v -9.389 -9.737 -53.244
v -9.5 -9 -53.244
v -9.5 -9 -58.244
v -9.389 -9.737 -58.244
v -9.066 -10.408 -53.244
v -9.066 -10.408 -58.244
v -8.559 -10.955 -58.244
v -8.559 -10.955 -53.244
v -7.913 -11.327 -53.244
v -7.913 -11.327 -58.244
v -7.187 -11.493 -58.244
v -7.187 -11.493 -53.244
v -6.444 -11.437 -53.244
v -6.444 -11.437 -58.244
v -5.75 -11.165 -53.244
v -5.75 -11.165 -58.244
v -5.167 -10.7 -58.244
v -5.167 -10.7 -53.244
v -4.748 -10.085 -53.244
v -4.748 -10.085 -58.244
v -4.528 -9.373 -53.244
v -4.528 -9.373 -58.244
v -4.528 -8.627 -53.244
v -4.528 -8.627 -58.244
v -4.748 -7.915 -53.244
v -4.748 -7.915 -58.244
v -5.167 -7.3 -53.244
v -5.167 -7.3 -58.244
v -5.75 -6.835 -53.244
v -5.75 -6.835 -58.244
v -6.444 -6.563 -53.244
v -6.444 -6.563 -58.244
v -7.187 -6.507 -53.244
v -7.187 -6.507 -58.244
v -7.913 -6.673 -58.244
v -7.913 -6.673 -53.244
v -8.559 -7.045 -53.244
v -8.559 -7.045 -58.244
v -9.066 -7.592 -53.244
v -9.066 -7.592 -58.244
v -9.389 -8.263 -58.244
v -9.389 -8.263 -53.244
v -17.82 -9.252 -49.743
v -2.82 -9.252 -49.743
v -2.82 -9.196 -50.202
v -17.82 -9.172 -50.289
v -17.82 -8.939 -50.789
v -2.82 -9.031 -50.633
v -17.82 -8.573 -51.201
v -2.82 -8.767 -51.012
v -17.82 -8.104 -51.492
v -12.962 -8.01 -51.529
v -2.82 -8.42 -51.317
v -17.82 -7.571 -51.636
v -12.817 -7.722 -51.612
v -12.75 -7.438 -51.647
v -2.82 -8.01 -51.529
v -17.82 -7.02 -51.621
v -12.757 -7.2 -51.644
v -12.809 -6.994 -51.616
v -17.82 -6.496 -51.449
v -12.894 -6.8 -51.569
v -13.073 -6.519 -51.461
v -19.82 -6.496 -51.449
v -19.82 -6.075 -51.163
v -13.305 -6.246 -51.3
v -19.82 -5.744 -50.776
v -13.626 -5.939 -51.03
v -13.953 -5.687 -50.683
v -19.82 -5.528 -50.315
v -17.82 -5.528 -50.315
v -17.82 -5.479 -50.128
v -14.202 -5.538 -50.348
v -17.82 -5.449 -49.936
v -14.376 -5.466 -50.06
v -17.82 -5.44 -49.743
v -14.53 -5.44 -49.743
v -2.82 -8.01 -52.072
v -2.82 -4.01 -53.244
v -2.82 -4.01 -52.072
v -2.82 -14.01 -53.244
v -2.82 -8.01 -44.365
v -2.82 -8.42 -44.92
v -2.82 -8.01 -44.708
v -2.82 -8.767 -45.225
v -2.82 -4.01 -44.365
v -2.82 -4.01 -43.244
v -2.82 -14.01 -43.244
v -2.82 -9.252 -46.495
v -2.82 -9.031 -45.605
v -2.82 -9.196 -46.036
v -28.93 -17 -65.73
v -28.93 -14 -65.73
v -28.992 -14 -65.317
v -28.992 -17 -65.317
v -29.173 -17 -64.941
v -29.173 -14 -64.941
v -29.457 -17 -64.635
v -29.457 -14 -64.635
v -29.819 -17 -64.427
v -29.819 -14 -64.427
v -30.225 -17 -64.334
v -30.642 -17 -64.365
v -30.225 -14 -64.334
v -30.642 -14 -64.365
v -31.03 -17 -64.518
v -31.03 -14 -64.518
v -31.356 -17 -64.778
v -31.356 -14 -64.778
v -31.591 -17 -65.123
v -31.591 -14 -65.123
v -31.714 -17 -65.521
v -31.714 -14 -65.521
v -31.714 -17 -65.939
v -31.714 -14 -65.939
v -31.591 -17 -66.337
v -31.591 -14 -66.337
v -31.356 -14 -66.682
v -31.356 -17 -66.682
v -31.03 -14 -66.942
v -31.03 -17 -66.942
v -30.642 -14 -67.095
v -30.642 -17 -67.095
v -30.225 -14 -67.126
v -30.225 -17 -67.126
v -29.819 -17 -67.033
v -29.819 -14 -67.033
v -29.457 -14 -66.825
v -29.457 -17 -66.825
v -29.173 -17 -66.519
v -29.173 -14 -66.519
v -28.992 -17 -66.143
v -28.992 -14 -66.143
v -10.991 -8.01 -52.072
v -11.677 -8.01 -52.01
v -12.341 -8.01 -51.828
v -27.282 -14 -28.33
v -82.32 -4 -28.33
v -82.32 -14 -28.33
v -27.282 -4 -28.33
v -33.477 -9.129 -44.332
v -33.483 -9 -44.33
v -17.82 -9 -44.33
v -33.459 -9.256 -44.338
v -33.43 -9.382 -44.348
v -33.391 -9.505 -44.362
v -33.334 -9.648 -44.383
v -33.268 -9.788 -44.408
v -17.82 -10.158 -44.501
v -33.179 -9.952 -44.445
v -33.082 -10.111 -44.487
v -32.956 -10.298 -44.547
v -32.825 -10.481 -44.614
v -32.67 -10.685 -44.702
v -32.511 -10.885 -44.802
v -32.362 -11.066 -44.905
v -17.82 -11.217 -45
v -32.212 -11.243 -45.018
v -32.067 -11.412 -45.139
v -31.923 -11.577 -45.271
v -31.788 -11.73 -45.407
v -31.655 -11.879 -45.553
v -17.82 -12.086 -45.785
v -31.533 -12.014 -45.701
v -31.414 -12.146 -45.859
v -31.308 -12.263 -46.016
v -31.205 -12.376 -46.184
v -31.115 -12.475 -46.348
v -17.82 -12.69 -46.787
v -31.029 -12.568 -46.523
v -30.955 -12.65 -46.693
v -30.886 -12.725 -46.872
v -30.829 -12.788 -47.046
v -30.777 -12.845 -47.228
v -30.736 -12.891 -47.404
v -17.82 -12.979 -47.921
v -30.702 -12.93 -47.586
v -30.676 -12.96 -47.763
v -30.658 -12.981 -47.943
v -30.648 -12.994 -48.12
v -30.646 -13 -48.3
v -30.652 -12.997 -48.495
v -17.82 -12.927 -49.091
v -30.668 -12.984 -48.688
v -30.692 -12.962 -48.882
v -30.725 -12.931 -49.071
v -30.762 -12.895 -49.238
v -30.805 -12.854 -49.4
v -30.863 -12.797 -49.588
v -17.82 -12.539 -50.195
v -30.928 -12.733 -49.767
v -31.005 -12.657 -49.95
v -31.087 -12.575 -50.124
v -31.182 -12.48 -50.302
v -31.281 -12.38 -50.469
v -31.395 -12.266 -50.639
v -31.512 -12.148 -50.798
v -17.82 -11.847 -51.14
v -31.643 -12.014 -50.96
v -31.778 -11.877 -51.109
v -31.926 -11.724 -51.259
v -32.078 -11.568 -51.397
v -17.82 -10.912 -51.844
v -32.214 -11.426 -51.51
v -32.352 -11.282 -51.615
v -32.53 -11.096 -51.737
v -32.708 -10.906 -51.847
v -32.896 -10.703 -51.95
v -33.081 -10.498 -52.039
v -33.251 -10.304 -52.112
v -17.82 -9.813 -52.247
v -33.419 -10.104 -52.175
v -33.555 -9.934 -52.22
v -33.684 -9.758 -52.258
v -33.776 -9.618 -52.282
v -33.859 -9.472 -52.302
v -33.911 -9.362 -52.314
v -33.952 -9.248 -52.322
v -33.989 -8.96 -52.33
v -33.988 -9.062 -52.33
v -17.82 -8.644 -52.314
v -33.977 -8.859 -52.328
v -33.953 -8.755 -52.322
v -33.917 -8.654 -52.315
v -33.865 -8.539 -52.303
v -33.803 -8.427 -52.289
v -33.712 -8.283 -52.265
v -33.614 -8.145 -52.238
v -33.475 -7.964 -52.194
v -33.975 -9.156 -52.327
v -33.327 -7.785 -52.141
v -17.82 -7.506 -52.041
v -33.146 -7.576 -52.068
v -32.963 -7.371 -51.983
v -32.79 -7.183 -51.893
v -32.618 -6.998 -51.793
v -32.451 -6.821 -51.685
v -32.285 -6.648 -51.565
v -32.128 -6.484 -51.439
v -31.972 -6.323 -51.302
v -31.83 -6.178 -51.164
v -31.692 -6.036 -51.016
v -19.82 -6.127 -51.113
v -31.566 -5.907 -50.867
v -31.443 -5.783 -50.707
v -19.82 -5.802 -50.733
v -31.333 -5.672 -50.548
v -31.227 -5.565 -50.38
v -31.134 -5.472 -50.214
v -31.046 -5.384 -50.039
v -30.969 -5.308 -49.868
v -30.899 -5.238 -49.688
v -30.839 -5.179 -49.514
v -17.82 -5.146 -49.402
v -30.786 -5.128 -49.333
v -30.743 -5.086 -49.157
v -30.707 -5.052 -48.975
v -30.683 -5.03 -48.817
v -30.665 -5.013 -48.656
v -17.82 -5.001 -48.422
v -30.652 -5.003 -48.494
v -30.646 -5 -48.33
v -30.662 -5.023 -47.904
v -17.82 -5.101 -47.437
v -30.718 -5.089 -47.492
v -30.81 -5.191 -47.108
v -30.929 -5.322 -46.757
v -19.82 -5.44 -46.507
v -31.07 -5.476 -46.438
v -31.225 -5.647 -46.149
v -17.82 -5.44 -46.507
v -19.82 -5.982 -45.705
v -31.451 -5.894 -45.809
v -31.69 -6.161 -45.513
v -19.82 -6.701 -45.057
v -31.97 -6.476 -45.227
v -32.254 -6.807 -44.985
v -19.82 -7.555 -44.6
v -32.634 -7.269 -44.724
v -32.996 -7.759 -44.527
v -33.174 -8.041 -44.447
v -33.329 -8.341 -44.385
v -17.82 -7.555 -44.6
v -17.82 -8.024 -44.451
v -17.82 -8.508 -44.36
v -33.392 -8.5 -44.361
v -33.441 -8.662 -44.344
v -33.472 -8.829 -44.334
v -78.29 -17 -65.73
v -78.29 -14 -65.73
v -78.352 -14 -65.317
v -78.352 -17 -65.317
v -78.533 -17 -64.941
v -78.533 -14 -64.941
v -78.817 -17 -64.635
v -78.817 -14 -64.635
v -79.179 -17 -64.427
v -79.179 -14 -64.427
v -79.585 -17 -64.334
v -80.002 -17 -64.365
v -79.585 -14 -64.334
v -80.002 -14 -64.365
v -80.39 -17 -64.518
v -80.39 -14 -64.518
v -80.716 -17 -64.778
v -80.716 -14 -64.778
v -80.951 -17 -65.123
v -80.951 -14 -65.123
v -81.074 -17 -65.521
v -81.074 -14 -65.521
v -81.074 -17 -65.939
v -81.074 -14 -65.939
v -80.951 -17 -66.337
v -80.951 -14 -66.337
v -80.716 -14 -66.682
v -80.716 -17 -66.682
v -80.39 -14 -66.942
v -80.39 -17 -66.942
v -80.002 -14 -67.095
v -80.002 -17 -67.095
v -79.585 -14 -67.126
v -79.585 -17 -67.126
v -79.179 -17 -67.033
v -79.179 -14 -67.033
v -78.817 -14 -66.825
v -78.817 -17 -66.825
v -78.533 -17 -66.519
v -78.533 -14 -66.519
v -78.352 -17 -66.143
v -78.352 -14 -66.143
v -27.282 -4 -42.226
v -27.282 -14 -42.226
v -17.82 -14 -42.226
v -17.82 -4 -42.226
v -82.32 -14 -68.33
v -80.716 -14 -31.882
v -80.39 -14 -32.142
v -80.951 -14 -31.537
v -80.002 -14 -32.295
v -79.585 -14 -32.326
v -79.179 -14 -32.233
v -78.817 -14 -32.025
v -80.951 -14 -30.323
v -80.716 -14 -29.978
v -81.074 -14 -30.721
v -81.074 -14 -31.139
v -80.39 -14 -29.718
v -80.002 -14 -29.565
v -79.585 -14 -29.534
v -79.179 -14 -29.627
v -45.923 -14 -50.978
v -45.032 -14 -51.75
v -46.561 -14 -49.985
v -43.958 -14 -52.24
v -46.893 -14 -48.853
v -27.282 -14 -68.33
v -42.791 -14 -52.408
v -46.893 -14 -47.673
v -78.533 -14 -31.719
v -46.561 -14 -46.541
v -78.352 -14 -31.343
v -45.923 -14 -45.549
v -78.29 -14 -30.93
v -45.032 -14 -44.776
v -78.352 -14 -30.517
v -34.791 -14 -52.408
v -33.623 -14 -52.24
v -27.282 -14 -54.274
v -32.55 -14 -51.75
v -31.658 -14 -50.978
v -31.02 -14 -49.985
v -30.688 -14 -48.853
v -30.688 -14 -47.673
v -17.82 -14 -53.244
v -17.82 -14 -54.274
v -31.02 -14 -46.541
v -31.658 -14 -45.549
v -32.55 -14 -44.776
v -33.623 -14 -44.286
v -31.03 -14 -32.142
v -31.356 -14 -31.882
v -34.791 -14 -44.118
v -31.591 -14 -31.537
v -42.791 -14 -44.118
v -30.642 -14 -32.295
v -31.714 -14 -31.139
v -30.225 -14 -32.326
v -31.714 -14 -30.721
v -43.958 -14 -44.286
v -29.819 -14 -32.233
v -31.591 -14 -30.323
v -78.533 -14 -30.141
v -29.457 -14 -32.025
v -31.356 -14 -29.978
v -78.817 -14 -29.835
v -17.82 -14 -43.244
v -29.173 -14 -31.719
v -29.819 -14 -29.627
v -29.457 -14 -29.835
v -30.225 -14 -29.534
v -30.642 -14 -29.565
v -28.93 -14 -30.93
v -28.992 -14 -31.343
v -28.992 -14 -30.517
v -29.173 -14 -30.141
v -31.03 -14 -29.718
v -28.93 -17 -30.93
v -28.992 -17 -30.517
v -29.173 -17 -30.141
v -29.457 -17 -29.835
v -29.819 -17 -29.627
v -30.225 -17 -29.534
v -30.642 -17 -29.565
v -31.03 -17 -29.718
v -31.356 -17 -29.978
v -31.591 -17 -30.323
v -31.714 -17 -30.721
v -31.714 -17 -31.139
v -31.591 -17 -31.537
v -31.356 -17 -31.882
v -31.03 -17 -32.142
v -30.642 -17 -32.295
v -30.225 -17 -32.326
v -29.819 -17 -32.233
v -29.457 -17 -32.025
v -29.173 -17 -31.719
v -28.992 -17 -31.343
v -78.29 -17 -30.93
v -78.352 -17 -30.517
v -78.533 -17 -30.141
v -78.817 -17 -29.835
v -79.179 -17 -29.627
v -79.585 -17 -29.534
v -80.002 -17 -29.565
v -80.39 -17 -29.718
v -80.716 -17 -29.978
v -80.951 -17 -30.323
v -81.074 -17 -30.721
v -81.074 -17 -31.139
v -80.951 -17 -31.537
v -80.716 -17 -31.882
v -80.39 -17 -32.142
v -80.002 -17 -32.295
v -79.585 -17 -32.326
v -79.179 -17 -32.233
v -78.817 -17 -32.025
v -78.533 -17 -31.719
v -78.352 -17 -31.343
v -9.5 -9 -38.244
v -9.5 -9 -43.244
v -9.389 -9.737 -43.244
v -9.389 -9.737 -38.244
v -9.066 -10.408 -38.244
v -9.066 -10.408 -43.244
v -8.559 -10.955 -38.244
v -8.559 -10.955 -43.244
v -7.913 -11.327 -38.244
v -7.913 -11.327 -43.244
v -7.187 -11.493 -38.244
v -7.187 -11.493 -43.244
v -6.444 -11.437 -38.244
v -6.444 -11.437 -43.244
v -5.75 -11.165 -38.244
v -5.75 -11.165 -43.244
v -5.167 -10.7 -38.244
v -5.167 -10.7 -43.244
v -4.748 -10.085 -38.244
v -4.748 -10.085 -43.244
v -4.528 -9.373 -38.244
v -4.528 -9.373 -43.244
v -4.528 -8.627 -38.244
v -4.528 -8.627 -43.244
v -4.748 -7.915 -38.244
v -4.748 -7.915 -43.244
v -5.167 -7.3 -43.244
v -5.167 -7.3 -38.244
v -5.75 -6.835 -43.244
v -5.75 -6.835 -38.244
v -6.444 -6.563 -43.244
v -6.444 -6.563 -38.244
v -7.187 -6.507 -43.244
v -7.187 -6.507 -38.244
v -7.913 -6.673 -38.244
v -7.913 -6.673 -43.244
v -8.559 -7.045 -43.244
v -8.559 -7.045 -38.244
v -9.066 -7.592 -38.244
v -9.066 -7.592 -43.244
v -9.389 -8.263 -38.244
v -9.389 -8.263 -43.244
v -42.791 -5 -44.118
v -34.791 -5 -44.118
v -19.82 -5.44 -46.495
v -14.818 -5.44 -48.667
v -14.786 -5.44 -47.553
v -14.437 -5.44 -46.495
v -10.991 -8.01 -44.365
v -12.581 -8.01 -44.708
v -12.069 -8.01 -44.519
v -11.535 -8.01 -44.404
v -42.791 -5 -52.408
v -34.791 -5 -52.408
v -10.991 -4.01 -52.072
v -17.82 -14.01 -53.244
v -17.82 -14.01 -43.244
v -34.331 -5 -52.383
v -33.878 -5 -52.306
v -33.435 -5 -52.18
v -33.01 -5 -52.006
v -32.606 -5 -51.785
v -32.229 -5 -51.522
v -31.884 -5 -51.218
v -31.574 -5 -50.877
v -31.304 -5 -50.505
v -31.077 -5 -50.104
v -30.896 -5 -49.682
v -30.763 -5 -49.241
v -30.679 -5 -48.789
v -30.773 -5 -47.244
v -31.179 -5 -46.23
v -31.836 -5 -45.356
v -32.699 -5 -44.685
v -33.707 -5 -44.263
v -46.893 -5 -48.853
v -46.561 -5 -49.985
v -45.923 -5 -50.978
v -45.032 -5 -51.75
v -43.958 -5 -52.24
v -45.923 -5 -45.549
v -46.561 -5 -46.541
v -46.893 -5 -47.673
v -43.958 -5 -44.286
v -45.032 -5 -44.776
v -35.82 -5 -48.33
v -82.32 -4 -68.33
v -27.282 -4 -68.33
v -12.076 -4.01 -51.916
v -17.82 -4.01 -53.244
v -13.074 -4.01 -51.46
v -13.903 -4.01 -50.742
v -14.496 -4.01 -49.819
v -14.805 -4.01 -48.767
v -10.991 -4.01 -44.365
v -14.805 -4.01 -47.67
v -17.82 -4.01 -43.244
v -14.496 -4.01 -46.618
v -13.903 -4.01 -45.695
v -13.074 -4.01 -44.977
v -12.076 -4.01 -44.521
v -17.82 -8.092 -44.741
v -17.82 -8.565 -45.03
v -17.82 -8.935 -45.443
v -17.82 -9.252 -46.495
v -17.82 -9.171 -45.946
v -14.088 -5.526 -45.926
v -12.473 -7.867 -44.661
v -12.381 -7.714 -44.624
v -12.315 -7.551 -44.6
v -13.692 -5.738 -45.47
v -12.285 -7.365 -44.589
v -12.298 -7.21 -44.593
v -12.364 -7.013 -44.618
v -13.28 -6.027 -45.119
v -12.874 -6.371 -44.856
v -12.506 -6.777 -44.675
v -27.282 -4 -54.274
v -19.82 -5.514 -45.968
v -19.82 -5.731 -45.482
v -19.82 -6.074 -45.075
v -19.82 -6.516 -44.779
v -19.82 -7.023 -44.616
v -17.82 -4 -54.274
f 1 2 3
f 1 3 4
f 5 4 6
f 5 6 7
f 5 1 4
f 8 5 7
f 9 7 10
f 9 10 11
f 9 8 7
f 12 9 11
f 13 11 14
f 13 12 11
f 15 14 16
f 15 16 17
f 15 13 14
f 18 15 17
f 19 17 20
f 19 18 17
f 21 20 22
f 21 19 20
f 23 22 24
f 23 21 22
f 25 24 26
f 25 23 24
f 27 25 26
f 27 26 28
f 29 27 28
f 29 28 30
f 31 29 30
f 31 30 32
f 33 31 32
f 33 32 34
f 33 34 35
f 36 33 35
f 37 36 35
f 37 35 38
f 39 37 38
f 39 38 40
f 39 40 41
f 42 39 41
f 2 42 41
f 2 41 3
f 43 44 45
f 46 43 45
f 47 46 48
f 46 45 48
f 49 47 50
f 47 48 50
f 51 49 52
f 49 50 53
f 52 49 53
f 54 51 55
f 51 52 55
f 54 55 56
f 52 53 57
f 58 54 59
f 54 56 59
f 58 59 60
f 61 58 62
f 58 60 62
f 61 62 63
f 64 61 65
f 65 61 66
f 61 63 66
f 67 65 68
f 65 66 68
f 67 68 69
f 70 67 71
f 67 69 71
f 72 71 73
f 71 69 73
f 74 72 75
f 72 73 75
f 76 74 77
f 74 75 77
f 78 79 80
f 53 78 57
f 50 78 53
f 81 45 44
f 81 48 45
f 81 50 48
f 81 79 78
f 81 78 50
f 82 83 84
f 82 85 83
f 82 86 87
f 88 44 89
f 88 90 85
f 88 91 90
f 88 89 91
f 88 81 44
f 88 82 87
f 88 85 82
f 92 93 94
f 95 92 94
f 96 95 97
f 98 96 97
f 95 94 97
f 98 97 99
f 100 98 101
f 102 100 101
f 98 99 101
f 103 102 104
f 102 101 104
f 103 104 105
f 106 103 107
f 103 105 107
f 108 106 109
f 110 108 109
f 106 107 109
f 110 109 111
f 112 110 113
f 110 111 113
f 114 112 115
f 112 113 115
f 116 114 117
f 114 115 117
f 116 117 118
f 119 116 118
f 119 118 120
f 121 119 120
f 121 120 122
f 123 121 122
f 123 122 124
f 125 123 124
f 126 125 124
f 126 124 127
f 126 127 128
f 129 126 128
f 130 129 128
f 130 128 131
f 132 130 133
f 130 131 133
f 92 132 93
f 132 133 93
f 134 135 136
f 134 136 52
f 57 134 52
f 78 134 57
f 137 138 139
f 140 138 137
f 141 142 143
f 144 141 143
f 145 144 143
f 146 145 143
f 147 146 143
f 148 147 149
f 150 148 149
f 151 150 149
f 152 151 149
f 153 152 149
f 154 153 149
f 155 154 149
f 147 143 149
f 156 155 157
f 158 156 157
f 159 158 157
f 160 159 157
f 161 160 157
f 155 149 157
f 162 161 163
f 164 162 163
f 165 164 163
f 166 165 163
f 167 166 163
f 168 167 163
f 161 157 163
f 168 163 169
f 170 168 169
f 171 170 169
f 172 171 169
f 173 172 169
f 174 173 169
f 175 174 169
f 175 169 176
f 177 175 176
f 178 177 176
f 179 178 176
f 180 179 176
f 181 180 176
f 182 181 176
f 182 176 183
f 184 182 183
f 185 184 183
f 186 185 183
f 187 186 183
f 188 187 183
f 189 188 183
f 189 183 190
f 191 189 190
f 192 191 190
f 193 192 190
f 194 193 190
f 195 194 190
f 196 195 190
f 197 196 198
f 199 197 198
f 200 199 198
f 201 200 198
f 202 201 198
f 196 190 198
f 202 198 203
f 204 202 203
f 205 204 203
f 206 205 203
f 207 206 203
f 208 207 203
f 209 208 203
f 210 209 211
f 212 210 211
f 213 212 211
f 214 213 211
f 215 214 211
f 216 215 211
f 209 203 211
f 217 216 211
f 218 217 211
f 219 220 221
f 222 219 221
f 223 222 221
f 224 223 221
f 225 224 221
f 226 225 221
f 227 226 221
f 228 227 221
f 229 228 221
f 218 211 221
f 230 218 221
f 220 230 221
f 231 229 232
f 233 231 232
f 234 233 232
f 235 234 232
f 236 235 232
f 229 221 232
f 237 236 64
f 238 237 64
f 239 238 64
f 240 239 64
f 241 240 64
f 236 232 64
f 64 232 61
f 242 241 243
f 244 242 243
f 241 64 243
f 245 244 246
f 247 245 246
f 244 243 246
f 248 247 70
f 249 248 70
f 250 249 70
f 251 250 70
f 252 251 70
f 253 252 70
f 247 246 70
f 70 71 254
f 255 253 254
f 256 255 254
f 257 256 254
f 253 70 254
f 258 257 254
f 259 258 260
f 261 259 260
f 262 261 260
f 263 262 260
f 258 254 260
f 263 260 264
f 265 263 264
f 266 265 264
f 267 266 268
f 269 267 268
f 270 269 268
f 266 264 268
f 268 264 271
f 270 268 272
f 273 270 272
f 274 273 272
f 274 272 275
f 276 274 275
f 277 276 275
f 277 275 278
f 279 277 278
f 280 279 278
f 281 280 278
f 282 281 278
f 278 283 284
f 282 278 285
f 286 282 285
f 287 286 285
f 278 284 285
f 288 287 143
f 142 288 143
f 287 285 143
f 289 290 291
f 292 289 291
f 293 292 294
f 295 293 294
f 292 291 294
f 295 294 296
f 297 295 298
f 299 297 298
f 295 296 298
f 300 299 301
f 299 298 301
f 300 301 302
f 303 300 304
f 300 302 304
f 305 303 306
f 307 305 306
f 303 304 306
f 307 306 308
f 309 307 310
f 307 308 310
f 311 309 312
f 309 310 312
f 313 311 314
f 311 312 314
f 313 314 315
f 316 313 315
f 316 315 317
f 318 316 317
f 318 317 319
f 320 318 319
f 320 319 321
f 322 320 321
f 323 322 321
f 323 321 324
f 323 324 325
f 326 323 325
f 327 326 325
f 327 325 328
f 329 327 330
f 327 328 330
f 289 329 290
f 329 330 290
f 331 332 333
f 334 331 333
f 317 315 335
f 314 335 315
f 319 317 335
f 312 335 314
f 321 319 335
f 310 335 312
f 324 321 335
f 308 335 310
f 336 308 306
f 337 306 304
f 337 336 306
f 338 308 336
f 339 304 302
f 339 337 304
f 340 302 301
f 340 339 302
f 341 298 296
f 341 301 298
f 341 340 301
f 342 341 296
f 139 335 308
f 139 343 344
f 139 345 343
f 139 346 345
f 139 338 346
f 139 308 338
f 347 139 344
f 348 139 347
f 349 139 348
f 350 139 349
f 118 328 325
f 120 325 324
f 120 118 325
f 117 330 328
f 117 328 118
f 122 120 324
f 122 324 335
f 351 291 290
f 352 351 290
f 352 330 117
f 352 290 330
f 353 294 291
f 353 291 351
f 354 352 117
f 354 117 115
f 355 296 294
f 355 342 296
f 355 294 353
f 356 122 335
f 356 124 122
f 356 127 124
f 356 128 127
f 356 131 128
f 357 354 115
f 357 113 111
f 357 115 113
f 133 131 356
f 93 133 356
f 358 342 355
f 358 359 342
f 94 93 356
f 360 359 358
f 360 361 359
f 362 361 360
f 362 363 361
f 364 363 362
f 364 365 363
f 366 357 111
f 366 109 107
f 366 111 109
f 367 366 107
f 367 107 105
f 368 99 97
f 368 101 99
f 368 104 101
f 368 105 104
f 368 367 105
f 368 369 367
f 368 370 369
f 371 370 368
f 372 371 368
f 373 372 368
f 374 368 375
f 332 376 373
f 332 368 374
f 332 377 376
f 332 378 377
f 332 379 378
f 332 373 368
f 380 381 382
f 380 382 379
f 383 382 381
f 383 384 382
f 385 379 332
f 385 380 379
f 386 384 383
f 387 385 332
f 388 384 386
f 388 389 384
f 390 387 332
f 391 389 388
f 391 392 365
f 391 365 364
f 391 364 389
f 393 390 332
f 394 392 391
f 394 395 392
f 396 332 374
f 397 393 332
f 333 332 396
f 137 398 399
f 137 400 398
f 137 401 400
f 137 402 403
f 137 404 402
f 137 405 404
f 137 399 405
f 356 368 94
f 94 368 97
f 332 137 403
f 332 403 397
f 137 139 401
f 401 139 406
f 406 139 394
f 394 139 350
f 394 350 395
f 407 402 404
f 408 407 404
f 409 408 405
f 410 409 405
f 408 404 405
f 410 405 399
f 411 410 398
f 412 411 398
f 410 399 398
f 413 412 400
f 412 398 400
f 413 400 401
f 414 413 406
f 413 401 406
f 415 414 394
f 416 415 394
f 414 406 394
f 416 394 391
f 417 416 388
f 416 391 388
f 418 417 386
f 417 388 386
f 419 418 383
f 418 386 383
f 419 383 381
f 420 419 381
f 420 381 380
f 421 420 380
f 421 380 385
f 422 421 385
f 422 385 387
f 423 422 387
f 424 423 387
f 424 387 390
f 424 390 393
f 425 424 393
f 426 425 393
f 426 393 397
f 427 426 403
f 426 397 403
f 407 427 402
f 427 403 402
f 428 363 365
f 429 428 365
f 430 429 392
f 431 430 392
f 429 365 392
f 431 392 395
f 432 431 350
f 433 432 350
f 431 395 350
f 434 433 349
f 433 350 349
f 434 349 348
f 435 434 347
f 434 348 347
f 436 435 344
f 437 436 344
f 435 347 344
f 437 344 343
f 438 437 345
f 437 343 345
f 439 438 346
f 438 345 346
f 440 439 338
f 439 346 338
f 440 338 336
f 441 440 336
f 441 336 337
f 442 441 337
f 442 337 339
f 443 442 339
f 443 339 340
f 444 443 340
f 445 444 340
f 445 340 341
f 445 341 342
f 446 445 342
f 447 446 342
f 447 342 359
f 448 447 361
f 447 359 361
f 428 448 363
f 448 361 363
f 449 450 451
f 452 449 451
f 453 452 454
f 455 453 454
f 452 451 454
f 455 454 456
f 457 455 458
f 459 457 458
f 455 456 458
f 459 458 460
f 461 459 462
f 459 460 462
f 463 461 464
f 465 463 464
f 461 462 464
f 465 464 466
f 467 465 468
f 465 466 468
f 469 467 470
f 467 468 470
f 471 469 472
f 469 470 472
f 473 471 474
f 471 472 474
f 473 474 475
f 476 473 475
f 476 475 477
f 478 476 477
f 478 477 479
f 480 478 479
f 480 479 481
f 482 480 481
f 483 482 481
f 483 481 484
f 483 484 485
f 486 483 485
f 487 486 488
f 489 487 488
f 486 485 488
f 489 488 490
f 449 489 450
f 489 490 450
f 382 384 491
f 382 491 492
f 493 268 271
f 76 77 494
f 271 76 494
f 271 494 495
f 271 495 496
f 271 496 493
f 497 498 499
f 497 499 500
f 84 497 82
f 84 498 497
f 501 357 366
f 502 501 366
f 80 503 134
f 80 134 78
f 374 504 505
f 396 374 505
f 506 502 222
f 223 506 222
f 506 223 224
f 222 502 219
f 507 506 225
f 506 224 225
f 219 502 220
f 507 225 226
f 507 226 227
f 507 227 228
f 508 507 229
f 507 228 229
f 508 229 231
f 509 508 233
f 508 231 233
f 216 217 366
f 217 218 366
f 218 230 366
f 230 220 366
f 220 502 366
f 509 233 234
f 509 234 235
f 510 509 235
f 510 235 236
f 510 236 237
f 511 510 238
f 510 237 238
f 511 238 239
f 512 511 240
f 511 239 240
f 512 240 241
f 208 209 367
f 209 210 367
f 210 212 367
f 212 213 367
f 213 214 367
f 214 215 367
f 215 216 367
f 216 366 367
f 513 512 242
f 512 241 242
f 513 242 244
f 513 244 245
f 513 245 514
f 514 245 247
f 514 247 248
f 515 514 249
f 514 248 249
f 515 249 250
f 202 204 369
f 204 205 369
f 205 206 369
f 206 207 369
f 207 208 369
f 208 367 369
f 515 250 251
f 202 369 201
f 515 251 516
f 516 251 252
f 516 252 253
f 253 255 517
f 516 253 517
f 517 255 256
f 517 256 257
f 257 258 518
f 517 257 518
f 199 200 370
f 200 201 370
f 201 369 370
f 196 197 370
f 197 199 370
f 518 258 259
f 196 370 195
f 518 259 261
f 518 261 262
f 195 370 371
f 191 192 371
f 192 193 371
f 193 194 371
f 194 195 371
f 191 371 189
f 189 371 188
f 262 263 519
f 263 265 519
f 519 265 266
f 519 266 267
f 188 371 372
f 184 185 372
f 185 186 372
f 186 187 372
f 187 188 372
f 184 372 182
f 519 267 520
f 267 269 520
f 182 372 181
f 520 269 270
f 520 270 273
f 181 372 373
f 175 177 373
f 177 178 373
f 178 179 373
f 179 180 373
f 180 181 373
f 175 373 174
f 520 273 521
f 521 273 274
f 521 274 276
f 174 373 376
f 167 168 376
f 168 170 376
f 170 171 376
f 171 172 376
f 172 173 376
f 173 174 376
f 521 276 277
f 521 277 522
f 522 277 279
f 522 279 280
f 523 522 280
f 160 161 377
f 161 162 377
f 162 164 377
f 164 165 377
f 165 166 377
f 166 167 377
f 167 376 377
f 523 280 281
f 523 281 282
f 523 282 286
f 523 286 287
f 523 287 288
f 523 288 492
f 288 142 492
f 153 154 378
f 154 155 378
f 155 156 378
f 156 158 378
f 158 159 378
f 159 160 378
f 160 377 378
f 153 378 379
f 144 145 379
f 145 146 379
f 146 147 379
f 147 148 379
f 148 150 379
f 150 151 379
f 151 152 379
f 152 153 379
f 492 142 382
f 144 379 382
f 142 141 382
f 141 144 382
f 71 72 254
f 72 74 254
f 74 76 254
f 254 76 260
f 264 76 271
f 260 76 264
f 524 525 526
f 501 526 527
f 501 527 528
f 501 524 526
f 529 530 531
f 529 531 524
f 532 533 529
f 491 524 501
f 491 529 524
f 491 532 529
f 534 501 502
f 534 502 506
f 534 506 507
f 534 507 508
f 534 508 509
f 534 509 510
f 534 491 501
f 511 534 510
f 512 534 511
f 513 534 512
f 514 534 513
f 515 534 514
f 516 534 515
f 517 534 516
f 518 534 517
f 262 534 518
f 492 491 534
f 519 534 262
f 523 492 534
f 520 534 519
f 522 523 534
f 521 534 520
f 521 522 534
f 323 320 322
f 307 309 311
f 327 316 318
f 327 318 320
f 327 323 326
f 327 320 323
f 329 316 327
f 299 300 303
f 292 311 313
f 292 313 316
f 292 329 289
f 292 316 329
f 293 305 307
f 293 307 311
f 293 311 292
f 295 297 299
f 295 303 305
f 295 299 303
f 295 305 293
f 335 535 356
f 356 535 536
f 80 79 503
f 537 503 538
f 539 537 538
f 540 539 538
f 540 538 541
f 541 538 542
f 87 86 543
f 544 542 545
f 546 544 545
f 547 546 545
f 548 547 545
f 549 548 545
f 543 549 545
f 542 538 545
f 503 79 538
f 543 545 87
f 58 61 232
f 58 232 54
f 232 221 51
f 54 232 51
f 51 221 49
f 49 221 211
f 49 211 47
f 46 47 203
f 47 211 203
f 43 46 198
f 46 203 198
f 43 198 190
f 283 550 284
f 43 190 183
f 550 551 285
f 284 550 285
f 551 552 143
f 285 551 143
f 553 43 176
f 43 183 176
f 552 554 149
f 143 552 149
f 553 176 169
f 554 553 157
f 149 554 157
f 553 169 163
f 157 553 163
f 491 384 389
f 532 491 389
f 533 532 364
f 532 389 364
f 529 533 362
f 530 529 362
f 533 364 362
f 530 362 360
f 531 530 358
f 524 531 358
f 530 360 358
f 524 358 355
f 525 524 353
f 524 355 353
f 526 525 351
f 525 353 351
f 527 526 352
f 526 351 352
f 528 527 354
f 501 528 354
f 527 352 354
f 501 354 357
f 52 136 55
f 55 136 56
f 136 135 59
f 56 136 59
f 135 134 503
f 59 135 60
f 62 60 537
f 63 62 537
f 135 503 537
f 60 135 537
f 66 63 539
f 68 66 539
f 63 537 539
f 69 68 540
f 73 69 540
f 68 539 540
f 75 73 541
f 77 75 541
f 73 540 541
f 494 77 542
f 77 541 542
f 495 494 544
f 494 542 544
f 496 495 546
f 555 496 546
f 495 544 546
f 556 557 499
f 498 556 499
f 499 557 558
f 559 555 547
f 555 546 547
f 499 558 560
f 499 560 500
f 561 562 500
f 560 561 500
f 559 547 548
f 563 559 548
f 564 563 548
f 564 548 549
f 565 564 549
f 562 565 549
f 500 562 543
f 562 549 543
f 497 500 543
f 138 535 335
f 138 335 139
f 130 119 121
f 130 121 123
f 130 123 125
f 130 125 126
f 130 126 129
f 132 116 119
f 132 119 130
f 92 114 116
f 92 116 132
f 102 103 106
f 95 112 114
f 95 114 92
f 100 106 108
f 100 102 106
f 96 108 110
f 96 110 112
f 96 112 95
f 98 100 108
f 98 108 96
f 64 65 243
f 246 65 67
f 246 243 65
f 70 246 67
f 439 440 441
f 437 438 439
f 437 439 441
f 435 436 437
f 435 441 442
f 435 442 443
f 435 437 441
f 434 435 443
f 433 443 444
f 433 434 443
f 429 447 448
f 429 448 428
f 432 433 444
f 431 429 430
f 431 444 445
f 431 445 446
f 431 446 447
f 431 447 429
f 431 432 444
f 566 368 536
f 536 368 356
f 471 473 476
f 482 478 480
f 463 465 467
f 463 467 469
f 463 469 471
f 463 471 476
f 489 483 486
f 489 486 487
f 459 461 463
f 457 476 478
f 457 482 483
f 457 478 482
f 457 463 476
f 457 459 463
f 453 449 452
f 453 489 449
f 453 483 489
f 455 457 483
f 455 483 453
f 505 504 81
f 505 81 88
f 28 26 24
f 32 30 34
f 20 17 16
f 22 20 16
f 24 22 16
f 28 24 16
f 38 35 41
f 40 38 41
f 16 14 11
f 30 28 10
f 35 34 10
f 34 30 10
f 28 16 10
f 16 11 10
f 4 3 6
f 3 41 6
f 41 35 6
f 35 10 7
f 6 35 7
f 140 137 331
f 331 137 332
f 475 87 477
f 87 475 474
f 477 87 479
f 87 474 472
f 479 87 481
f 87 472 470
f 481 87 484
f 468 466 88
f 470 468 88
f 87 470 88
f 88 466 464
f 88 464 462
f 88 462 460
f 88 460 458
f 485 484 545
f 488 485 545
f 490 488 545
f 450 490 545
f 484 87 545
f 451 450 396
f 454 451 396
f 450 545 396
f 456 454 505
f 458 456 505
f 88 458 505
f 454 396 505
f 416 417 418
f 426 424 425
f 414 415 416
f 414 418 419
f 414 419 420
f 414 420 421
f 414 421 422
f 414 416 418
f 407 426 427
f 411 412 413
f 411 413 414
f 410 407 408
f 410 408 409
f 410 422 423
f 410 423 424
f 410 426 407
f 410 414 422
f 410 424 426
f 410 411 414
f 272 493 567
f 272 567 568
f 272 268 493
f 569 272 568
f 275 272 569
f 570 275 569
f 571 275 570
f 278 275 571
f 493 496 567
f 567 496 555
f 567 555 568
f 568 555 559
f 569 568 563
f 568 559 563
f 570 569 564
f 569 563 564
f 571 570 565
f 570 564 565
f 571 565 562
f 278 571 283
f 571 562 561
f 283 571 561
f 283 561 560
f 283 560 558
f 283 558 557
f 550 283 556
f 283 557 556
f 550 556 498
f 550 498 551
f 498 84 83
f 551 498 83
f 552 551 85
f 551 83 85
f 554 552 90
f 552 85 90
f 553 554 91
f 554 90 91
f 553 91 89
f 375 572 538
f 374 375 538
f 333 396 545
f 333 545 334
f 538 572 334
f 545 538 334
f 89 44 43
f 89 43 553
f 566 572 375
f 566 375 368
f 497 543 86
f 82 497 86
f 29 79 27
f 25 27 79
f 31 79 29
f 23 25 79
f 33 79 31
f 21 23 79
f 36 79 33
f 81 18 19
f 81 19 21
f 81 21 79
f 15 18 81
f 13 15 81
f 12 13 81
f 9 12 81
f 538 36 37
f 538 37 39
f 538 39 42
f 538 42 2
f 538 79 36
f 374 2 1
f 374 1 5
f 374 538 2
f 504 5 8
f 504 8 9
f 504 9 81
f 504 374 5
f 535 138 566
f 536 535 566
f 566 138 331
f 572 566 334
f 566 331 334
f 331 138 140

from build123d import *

# Parameters (mm, degrees)
SKETCH032_W       = 64.5
SKETCH032_H       = 40
PAD013_DEPTH      = 10
SKETCH034_R       = 1.4
PAD014_DEPTH      = 3
SKETCH035_R       = 4
HOLE003_DEPTH     = 18
POCKET015_DEPTH   = 9
POCKET016_DEPTH   = 10.001
SKETCH038_W       = 10
SKETCH038_H       = 10
PAD015_DEPTH      = 15
SKETCH039_R       = 2.5
PAD016_DEPTH      = 5
PAD016_DEPTH_BACK = 15
POCKET017_DEPTH   = 17
POCKET019_DEPTH   = 4


with BuildPart() as part:
    # Sketch032 → Pad013 (new body)
    with BuildSketch(Plane.XZ):
        with Locations((-50.07, -27.33)):
            Rectangle(SKETCH032_W, SKETCH032_H)
    extrude(amount=PAD013_DEPTH)

    # Sketch034 (on Face6 of Pad013) → Pad014 (join)
    with BuildSketch(Plane.XZ.offset(10)):
        with Locations((-79.69, -44.73)):
            Circle(SKETCH034_R)
        with Locations((-79.69, -9.93)):
            Circle(SKETCH034_R)
        with Locations((-30.33, -44.73)):
            Circle(SKETCH034_R)
        with Locations((-30.33, -9.93)):
            Circle(SKETCH034_R)
    extrude(amount=PAD014_DEPTH)

    # Sketch035 (on Face2 of Pad014) → Hole003 (cut)
    with BuildSketch(Plane(origin=(-17.82, 0, 0), x_dir=(0, 0, 1), z_dir=(1, 0, 0))):
        with Locations((-27.33, 5)):
            Circle(SKETCH035_R)
    extrude(amount=-HOLE003_DEPTH, mode=Mode.SUBTRACT)

    # Sketch036 (on Face5 of Hole003) → Pocket015 (cut)
    with BuildSketch(Plane.XZ.offset(10)):
        with BuildLine():
            ThreePointArc((-42.7907317107, -23.1184468896), (-46.935543609, -27.2632587879), (-42.7907317107, -31.4080706862))
            Line((-42.7907317107, -31.4080706862), (-34.7907317107, -31.4080706862))
            ThreePointArc((-34.7907317107, -31.4080706862), (-30.6459198124, -27.2632587879), (-34.7907317107, -23.1184468896))
            Line((-42.7907317107, -23.1184468896), (-34.7907317107, -23.1184468896))
        make_face()
    extrude(amount=-POCKET015_DEPTH, mode=Mode.SUBTRACT)

    # Sketch037 (on Face5 of Pocket015) → Pocket016 (cut, through all)
    with BuildSketch(Plane.XZ.offset(10)):
        Polygon((-8.75606, -47.792807), (-8.75606, -6.792807), (-27.2815885194, -6.792807), (-27.2815885194, -21.225657), (-14.1415885194, -21.225657), (-14.1415885194, -33.274418), (-27.2815885194, -33.274418), (-27.2815885194, -47.792807), align=None)
    extrude(amount=-POCKET016_DEPTH, mode=Mode.SUBTRACT)

    # Sketch038 (on Face7 of Pocket016) → Pad015 (join)
    with BuildSketch(Plane(origin=(-17.82, 0, 0), x_dir=(0, 0, 1), z_dir=(1, 0, 0))):
        with Locations((-27.24382, 5.01)):
            Rectangle(SKETCH038_W, SKETCH038_H)
    extrude(amount=PAD015_DEPTH)

    # Sketch039 (on Face20 of Pad015) → Pad016 (join, two sides)
    with BuildSketch(Plane(origin=(0, 0, -22.24382), x_dir=(-1, 0, 0), z_dir=(0, 0, 1))) as pad016_sk:
        with Locations((7, 5)):
            Circle(SKETCH039_R)
    extrude(amount=PAD016_DEPTH)
    extrude(pad016_sk.sketch, amount=-PAD016_DEPTH_BACK)

    # Sketch040 (on Face31 of Pad016) → Pocket017 (cut)
    with BuildSketch(Plane(origin=(-2.82, 0, 0), x_dir=(0, 0, 1), z_dir=(1, 0, 0))):
        with BuildLine():
            ThreePointArc((-28.743006, 5.2516311207), (-30.6490431207, 3.345594), (-28.743006, 1.4395568793))
            Line((-28.743006, 1.4395568793), (-25.494635, 1.4395568793))
            ThreePointArc((-25.494635, 1.4395568793), (-23.5885978793, 3.345594), (-25.494635, 5.2516311207))
            Line((-28.743006, 5.2516311207), (-25.494635, 5.2516311207))
        make_face()
    extrude(amount=-POCKET017_DEPTH, mode=Mode.SUBTRACT)

    # Sketch045 (on Face21 of Pocket017) → Pocket019 (cut)
    with BuildSketch(Plane(origin=(0, -0.01, 0), x_dir=(1, 0, 0), z_dir=(0, 1, 0))):
        with BuildLine():
            ThreePointArc((-10.990606, 31.0720355), (-14.8442005, 27.218441), (-10.990606, 23.3648465))
            Line((-10.990606, 23.3648465), (5.086273, 23.3648465))
            ThreePointArc((5.086273, 23.3648465), (8.9398675, 27.218441), (5.086273, 31.0720355))
            Line((-10.990606, 31.0720355), (5.086273, 31.0720355))
        make_face()
    extrude(amount=-POCKET019_DEPTH, mode=Mode.SUBTRACT)


with BuildPart() as part_1:
    # Body006 placement: moved
    add(part.part.moved(Location((0, -4, -21))))


solid = part_1.part
